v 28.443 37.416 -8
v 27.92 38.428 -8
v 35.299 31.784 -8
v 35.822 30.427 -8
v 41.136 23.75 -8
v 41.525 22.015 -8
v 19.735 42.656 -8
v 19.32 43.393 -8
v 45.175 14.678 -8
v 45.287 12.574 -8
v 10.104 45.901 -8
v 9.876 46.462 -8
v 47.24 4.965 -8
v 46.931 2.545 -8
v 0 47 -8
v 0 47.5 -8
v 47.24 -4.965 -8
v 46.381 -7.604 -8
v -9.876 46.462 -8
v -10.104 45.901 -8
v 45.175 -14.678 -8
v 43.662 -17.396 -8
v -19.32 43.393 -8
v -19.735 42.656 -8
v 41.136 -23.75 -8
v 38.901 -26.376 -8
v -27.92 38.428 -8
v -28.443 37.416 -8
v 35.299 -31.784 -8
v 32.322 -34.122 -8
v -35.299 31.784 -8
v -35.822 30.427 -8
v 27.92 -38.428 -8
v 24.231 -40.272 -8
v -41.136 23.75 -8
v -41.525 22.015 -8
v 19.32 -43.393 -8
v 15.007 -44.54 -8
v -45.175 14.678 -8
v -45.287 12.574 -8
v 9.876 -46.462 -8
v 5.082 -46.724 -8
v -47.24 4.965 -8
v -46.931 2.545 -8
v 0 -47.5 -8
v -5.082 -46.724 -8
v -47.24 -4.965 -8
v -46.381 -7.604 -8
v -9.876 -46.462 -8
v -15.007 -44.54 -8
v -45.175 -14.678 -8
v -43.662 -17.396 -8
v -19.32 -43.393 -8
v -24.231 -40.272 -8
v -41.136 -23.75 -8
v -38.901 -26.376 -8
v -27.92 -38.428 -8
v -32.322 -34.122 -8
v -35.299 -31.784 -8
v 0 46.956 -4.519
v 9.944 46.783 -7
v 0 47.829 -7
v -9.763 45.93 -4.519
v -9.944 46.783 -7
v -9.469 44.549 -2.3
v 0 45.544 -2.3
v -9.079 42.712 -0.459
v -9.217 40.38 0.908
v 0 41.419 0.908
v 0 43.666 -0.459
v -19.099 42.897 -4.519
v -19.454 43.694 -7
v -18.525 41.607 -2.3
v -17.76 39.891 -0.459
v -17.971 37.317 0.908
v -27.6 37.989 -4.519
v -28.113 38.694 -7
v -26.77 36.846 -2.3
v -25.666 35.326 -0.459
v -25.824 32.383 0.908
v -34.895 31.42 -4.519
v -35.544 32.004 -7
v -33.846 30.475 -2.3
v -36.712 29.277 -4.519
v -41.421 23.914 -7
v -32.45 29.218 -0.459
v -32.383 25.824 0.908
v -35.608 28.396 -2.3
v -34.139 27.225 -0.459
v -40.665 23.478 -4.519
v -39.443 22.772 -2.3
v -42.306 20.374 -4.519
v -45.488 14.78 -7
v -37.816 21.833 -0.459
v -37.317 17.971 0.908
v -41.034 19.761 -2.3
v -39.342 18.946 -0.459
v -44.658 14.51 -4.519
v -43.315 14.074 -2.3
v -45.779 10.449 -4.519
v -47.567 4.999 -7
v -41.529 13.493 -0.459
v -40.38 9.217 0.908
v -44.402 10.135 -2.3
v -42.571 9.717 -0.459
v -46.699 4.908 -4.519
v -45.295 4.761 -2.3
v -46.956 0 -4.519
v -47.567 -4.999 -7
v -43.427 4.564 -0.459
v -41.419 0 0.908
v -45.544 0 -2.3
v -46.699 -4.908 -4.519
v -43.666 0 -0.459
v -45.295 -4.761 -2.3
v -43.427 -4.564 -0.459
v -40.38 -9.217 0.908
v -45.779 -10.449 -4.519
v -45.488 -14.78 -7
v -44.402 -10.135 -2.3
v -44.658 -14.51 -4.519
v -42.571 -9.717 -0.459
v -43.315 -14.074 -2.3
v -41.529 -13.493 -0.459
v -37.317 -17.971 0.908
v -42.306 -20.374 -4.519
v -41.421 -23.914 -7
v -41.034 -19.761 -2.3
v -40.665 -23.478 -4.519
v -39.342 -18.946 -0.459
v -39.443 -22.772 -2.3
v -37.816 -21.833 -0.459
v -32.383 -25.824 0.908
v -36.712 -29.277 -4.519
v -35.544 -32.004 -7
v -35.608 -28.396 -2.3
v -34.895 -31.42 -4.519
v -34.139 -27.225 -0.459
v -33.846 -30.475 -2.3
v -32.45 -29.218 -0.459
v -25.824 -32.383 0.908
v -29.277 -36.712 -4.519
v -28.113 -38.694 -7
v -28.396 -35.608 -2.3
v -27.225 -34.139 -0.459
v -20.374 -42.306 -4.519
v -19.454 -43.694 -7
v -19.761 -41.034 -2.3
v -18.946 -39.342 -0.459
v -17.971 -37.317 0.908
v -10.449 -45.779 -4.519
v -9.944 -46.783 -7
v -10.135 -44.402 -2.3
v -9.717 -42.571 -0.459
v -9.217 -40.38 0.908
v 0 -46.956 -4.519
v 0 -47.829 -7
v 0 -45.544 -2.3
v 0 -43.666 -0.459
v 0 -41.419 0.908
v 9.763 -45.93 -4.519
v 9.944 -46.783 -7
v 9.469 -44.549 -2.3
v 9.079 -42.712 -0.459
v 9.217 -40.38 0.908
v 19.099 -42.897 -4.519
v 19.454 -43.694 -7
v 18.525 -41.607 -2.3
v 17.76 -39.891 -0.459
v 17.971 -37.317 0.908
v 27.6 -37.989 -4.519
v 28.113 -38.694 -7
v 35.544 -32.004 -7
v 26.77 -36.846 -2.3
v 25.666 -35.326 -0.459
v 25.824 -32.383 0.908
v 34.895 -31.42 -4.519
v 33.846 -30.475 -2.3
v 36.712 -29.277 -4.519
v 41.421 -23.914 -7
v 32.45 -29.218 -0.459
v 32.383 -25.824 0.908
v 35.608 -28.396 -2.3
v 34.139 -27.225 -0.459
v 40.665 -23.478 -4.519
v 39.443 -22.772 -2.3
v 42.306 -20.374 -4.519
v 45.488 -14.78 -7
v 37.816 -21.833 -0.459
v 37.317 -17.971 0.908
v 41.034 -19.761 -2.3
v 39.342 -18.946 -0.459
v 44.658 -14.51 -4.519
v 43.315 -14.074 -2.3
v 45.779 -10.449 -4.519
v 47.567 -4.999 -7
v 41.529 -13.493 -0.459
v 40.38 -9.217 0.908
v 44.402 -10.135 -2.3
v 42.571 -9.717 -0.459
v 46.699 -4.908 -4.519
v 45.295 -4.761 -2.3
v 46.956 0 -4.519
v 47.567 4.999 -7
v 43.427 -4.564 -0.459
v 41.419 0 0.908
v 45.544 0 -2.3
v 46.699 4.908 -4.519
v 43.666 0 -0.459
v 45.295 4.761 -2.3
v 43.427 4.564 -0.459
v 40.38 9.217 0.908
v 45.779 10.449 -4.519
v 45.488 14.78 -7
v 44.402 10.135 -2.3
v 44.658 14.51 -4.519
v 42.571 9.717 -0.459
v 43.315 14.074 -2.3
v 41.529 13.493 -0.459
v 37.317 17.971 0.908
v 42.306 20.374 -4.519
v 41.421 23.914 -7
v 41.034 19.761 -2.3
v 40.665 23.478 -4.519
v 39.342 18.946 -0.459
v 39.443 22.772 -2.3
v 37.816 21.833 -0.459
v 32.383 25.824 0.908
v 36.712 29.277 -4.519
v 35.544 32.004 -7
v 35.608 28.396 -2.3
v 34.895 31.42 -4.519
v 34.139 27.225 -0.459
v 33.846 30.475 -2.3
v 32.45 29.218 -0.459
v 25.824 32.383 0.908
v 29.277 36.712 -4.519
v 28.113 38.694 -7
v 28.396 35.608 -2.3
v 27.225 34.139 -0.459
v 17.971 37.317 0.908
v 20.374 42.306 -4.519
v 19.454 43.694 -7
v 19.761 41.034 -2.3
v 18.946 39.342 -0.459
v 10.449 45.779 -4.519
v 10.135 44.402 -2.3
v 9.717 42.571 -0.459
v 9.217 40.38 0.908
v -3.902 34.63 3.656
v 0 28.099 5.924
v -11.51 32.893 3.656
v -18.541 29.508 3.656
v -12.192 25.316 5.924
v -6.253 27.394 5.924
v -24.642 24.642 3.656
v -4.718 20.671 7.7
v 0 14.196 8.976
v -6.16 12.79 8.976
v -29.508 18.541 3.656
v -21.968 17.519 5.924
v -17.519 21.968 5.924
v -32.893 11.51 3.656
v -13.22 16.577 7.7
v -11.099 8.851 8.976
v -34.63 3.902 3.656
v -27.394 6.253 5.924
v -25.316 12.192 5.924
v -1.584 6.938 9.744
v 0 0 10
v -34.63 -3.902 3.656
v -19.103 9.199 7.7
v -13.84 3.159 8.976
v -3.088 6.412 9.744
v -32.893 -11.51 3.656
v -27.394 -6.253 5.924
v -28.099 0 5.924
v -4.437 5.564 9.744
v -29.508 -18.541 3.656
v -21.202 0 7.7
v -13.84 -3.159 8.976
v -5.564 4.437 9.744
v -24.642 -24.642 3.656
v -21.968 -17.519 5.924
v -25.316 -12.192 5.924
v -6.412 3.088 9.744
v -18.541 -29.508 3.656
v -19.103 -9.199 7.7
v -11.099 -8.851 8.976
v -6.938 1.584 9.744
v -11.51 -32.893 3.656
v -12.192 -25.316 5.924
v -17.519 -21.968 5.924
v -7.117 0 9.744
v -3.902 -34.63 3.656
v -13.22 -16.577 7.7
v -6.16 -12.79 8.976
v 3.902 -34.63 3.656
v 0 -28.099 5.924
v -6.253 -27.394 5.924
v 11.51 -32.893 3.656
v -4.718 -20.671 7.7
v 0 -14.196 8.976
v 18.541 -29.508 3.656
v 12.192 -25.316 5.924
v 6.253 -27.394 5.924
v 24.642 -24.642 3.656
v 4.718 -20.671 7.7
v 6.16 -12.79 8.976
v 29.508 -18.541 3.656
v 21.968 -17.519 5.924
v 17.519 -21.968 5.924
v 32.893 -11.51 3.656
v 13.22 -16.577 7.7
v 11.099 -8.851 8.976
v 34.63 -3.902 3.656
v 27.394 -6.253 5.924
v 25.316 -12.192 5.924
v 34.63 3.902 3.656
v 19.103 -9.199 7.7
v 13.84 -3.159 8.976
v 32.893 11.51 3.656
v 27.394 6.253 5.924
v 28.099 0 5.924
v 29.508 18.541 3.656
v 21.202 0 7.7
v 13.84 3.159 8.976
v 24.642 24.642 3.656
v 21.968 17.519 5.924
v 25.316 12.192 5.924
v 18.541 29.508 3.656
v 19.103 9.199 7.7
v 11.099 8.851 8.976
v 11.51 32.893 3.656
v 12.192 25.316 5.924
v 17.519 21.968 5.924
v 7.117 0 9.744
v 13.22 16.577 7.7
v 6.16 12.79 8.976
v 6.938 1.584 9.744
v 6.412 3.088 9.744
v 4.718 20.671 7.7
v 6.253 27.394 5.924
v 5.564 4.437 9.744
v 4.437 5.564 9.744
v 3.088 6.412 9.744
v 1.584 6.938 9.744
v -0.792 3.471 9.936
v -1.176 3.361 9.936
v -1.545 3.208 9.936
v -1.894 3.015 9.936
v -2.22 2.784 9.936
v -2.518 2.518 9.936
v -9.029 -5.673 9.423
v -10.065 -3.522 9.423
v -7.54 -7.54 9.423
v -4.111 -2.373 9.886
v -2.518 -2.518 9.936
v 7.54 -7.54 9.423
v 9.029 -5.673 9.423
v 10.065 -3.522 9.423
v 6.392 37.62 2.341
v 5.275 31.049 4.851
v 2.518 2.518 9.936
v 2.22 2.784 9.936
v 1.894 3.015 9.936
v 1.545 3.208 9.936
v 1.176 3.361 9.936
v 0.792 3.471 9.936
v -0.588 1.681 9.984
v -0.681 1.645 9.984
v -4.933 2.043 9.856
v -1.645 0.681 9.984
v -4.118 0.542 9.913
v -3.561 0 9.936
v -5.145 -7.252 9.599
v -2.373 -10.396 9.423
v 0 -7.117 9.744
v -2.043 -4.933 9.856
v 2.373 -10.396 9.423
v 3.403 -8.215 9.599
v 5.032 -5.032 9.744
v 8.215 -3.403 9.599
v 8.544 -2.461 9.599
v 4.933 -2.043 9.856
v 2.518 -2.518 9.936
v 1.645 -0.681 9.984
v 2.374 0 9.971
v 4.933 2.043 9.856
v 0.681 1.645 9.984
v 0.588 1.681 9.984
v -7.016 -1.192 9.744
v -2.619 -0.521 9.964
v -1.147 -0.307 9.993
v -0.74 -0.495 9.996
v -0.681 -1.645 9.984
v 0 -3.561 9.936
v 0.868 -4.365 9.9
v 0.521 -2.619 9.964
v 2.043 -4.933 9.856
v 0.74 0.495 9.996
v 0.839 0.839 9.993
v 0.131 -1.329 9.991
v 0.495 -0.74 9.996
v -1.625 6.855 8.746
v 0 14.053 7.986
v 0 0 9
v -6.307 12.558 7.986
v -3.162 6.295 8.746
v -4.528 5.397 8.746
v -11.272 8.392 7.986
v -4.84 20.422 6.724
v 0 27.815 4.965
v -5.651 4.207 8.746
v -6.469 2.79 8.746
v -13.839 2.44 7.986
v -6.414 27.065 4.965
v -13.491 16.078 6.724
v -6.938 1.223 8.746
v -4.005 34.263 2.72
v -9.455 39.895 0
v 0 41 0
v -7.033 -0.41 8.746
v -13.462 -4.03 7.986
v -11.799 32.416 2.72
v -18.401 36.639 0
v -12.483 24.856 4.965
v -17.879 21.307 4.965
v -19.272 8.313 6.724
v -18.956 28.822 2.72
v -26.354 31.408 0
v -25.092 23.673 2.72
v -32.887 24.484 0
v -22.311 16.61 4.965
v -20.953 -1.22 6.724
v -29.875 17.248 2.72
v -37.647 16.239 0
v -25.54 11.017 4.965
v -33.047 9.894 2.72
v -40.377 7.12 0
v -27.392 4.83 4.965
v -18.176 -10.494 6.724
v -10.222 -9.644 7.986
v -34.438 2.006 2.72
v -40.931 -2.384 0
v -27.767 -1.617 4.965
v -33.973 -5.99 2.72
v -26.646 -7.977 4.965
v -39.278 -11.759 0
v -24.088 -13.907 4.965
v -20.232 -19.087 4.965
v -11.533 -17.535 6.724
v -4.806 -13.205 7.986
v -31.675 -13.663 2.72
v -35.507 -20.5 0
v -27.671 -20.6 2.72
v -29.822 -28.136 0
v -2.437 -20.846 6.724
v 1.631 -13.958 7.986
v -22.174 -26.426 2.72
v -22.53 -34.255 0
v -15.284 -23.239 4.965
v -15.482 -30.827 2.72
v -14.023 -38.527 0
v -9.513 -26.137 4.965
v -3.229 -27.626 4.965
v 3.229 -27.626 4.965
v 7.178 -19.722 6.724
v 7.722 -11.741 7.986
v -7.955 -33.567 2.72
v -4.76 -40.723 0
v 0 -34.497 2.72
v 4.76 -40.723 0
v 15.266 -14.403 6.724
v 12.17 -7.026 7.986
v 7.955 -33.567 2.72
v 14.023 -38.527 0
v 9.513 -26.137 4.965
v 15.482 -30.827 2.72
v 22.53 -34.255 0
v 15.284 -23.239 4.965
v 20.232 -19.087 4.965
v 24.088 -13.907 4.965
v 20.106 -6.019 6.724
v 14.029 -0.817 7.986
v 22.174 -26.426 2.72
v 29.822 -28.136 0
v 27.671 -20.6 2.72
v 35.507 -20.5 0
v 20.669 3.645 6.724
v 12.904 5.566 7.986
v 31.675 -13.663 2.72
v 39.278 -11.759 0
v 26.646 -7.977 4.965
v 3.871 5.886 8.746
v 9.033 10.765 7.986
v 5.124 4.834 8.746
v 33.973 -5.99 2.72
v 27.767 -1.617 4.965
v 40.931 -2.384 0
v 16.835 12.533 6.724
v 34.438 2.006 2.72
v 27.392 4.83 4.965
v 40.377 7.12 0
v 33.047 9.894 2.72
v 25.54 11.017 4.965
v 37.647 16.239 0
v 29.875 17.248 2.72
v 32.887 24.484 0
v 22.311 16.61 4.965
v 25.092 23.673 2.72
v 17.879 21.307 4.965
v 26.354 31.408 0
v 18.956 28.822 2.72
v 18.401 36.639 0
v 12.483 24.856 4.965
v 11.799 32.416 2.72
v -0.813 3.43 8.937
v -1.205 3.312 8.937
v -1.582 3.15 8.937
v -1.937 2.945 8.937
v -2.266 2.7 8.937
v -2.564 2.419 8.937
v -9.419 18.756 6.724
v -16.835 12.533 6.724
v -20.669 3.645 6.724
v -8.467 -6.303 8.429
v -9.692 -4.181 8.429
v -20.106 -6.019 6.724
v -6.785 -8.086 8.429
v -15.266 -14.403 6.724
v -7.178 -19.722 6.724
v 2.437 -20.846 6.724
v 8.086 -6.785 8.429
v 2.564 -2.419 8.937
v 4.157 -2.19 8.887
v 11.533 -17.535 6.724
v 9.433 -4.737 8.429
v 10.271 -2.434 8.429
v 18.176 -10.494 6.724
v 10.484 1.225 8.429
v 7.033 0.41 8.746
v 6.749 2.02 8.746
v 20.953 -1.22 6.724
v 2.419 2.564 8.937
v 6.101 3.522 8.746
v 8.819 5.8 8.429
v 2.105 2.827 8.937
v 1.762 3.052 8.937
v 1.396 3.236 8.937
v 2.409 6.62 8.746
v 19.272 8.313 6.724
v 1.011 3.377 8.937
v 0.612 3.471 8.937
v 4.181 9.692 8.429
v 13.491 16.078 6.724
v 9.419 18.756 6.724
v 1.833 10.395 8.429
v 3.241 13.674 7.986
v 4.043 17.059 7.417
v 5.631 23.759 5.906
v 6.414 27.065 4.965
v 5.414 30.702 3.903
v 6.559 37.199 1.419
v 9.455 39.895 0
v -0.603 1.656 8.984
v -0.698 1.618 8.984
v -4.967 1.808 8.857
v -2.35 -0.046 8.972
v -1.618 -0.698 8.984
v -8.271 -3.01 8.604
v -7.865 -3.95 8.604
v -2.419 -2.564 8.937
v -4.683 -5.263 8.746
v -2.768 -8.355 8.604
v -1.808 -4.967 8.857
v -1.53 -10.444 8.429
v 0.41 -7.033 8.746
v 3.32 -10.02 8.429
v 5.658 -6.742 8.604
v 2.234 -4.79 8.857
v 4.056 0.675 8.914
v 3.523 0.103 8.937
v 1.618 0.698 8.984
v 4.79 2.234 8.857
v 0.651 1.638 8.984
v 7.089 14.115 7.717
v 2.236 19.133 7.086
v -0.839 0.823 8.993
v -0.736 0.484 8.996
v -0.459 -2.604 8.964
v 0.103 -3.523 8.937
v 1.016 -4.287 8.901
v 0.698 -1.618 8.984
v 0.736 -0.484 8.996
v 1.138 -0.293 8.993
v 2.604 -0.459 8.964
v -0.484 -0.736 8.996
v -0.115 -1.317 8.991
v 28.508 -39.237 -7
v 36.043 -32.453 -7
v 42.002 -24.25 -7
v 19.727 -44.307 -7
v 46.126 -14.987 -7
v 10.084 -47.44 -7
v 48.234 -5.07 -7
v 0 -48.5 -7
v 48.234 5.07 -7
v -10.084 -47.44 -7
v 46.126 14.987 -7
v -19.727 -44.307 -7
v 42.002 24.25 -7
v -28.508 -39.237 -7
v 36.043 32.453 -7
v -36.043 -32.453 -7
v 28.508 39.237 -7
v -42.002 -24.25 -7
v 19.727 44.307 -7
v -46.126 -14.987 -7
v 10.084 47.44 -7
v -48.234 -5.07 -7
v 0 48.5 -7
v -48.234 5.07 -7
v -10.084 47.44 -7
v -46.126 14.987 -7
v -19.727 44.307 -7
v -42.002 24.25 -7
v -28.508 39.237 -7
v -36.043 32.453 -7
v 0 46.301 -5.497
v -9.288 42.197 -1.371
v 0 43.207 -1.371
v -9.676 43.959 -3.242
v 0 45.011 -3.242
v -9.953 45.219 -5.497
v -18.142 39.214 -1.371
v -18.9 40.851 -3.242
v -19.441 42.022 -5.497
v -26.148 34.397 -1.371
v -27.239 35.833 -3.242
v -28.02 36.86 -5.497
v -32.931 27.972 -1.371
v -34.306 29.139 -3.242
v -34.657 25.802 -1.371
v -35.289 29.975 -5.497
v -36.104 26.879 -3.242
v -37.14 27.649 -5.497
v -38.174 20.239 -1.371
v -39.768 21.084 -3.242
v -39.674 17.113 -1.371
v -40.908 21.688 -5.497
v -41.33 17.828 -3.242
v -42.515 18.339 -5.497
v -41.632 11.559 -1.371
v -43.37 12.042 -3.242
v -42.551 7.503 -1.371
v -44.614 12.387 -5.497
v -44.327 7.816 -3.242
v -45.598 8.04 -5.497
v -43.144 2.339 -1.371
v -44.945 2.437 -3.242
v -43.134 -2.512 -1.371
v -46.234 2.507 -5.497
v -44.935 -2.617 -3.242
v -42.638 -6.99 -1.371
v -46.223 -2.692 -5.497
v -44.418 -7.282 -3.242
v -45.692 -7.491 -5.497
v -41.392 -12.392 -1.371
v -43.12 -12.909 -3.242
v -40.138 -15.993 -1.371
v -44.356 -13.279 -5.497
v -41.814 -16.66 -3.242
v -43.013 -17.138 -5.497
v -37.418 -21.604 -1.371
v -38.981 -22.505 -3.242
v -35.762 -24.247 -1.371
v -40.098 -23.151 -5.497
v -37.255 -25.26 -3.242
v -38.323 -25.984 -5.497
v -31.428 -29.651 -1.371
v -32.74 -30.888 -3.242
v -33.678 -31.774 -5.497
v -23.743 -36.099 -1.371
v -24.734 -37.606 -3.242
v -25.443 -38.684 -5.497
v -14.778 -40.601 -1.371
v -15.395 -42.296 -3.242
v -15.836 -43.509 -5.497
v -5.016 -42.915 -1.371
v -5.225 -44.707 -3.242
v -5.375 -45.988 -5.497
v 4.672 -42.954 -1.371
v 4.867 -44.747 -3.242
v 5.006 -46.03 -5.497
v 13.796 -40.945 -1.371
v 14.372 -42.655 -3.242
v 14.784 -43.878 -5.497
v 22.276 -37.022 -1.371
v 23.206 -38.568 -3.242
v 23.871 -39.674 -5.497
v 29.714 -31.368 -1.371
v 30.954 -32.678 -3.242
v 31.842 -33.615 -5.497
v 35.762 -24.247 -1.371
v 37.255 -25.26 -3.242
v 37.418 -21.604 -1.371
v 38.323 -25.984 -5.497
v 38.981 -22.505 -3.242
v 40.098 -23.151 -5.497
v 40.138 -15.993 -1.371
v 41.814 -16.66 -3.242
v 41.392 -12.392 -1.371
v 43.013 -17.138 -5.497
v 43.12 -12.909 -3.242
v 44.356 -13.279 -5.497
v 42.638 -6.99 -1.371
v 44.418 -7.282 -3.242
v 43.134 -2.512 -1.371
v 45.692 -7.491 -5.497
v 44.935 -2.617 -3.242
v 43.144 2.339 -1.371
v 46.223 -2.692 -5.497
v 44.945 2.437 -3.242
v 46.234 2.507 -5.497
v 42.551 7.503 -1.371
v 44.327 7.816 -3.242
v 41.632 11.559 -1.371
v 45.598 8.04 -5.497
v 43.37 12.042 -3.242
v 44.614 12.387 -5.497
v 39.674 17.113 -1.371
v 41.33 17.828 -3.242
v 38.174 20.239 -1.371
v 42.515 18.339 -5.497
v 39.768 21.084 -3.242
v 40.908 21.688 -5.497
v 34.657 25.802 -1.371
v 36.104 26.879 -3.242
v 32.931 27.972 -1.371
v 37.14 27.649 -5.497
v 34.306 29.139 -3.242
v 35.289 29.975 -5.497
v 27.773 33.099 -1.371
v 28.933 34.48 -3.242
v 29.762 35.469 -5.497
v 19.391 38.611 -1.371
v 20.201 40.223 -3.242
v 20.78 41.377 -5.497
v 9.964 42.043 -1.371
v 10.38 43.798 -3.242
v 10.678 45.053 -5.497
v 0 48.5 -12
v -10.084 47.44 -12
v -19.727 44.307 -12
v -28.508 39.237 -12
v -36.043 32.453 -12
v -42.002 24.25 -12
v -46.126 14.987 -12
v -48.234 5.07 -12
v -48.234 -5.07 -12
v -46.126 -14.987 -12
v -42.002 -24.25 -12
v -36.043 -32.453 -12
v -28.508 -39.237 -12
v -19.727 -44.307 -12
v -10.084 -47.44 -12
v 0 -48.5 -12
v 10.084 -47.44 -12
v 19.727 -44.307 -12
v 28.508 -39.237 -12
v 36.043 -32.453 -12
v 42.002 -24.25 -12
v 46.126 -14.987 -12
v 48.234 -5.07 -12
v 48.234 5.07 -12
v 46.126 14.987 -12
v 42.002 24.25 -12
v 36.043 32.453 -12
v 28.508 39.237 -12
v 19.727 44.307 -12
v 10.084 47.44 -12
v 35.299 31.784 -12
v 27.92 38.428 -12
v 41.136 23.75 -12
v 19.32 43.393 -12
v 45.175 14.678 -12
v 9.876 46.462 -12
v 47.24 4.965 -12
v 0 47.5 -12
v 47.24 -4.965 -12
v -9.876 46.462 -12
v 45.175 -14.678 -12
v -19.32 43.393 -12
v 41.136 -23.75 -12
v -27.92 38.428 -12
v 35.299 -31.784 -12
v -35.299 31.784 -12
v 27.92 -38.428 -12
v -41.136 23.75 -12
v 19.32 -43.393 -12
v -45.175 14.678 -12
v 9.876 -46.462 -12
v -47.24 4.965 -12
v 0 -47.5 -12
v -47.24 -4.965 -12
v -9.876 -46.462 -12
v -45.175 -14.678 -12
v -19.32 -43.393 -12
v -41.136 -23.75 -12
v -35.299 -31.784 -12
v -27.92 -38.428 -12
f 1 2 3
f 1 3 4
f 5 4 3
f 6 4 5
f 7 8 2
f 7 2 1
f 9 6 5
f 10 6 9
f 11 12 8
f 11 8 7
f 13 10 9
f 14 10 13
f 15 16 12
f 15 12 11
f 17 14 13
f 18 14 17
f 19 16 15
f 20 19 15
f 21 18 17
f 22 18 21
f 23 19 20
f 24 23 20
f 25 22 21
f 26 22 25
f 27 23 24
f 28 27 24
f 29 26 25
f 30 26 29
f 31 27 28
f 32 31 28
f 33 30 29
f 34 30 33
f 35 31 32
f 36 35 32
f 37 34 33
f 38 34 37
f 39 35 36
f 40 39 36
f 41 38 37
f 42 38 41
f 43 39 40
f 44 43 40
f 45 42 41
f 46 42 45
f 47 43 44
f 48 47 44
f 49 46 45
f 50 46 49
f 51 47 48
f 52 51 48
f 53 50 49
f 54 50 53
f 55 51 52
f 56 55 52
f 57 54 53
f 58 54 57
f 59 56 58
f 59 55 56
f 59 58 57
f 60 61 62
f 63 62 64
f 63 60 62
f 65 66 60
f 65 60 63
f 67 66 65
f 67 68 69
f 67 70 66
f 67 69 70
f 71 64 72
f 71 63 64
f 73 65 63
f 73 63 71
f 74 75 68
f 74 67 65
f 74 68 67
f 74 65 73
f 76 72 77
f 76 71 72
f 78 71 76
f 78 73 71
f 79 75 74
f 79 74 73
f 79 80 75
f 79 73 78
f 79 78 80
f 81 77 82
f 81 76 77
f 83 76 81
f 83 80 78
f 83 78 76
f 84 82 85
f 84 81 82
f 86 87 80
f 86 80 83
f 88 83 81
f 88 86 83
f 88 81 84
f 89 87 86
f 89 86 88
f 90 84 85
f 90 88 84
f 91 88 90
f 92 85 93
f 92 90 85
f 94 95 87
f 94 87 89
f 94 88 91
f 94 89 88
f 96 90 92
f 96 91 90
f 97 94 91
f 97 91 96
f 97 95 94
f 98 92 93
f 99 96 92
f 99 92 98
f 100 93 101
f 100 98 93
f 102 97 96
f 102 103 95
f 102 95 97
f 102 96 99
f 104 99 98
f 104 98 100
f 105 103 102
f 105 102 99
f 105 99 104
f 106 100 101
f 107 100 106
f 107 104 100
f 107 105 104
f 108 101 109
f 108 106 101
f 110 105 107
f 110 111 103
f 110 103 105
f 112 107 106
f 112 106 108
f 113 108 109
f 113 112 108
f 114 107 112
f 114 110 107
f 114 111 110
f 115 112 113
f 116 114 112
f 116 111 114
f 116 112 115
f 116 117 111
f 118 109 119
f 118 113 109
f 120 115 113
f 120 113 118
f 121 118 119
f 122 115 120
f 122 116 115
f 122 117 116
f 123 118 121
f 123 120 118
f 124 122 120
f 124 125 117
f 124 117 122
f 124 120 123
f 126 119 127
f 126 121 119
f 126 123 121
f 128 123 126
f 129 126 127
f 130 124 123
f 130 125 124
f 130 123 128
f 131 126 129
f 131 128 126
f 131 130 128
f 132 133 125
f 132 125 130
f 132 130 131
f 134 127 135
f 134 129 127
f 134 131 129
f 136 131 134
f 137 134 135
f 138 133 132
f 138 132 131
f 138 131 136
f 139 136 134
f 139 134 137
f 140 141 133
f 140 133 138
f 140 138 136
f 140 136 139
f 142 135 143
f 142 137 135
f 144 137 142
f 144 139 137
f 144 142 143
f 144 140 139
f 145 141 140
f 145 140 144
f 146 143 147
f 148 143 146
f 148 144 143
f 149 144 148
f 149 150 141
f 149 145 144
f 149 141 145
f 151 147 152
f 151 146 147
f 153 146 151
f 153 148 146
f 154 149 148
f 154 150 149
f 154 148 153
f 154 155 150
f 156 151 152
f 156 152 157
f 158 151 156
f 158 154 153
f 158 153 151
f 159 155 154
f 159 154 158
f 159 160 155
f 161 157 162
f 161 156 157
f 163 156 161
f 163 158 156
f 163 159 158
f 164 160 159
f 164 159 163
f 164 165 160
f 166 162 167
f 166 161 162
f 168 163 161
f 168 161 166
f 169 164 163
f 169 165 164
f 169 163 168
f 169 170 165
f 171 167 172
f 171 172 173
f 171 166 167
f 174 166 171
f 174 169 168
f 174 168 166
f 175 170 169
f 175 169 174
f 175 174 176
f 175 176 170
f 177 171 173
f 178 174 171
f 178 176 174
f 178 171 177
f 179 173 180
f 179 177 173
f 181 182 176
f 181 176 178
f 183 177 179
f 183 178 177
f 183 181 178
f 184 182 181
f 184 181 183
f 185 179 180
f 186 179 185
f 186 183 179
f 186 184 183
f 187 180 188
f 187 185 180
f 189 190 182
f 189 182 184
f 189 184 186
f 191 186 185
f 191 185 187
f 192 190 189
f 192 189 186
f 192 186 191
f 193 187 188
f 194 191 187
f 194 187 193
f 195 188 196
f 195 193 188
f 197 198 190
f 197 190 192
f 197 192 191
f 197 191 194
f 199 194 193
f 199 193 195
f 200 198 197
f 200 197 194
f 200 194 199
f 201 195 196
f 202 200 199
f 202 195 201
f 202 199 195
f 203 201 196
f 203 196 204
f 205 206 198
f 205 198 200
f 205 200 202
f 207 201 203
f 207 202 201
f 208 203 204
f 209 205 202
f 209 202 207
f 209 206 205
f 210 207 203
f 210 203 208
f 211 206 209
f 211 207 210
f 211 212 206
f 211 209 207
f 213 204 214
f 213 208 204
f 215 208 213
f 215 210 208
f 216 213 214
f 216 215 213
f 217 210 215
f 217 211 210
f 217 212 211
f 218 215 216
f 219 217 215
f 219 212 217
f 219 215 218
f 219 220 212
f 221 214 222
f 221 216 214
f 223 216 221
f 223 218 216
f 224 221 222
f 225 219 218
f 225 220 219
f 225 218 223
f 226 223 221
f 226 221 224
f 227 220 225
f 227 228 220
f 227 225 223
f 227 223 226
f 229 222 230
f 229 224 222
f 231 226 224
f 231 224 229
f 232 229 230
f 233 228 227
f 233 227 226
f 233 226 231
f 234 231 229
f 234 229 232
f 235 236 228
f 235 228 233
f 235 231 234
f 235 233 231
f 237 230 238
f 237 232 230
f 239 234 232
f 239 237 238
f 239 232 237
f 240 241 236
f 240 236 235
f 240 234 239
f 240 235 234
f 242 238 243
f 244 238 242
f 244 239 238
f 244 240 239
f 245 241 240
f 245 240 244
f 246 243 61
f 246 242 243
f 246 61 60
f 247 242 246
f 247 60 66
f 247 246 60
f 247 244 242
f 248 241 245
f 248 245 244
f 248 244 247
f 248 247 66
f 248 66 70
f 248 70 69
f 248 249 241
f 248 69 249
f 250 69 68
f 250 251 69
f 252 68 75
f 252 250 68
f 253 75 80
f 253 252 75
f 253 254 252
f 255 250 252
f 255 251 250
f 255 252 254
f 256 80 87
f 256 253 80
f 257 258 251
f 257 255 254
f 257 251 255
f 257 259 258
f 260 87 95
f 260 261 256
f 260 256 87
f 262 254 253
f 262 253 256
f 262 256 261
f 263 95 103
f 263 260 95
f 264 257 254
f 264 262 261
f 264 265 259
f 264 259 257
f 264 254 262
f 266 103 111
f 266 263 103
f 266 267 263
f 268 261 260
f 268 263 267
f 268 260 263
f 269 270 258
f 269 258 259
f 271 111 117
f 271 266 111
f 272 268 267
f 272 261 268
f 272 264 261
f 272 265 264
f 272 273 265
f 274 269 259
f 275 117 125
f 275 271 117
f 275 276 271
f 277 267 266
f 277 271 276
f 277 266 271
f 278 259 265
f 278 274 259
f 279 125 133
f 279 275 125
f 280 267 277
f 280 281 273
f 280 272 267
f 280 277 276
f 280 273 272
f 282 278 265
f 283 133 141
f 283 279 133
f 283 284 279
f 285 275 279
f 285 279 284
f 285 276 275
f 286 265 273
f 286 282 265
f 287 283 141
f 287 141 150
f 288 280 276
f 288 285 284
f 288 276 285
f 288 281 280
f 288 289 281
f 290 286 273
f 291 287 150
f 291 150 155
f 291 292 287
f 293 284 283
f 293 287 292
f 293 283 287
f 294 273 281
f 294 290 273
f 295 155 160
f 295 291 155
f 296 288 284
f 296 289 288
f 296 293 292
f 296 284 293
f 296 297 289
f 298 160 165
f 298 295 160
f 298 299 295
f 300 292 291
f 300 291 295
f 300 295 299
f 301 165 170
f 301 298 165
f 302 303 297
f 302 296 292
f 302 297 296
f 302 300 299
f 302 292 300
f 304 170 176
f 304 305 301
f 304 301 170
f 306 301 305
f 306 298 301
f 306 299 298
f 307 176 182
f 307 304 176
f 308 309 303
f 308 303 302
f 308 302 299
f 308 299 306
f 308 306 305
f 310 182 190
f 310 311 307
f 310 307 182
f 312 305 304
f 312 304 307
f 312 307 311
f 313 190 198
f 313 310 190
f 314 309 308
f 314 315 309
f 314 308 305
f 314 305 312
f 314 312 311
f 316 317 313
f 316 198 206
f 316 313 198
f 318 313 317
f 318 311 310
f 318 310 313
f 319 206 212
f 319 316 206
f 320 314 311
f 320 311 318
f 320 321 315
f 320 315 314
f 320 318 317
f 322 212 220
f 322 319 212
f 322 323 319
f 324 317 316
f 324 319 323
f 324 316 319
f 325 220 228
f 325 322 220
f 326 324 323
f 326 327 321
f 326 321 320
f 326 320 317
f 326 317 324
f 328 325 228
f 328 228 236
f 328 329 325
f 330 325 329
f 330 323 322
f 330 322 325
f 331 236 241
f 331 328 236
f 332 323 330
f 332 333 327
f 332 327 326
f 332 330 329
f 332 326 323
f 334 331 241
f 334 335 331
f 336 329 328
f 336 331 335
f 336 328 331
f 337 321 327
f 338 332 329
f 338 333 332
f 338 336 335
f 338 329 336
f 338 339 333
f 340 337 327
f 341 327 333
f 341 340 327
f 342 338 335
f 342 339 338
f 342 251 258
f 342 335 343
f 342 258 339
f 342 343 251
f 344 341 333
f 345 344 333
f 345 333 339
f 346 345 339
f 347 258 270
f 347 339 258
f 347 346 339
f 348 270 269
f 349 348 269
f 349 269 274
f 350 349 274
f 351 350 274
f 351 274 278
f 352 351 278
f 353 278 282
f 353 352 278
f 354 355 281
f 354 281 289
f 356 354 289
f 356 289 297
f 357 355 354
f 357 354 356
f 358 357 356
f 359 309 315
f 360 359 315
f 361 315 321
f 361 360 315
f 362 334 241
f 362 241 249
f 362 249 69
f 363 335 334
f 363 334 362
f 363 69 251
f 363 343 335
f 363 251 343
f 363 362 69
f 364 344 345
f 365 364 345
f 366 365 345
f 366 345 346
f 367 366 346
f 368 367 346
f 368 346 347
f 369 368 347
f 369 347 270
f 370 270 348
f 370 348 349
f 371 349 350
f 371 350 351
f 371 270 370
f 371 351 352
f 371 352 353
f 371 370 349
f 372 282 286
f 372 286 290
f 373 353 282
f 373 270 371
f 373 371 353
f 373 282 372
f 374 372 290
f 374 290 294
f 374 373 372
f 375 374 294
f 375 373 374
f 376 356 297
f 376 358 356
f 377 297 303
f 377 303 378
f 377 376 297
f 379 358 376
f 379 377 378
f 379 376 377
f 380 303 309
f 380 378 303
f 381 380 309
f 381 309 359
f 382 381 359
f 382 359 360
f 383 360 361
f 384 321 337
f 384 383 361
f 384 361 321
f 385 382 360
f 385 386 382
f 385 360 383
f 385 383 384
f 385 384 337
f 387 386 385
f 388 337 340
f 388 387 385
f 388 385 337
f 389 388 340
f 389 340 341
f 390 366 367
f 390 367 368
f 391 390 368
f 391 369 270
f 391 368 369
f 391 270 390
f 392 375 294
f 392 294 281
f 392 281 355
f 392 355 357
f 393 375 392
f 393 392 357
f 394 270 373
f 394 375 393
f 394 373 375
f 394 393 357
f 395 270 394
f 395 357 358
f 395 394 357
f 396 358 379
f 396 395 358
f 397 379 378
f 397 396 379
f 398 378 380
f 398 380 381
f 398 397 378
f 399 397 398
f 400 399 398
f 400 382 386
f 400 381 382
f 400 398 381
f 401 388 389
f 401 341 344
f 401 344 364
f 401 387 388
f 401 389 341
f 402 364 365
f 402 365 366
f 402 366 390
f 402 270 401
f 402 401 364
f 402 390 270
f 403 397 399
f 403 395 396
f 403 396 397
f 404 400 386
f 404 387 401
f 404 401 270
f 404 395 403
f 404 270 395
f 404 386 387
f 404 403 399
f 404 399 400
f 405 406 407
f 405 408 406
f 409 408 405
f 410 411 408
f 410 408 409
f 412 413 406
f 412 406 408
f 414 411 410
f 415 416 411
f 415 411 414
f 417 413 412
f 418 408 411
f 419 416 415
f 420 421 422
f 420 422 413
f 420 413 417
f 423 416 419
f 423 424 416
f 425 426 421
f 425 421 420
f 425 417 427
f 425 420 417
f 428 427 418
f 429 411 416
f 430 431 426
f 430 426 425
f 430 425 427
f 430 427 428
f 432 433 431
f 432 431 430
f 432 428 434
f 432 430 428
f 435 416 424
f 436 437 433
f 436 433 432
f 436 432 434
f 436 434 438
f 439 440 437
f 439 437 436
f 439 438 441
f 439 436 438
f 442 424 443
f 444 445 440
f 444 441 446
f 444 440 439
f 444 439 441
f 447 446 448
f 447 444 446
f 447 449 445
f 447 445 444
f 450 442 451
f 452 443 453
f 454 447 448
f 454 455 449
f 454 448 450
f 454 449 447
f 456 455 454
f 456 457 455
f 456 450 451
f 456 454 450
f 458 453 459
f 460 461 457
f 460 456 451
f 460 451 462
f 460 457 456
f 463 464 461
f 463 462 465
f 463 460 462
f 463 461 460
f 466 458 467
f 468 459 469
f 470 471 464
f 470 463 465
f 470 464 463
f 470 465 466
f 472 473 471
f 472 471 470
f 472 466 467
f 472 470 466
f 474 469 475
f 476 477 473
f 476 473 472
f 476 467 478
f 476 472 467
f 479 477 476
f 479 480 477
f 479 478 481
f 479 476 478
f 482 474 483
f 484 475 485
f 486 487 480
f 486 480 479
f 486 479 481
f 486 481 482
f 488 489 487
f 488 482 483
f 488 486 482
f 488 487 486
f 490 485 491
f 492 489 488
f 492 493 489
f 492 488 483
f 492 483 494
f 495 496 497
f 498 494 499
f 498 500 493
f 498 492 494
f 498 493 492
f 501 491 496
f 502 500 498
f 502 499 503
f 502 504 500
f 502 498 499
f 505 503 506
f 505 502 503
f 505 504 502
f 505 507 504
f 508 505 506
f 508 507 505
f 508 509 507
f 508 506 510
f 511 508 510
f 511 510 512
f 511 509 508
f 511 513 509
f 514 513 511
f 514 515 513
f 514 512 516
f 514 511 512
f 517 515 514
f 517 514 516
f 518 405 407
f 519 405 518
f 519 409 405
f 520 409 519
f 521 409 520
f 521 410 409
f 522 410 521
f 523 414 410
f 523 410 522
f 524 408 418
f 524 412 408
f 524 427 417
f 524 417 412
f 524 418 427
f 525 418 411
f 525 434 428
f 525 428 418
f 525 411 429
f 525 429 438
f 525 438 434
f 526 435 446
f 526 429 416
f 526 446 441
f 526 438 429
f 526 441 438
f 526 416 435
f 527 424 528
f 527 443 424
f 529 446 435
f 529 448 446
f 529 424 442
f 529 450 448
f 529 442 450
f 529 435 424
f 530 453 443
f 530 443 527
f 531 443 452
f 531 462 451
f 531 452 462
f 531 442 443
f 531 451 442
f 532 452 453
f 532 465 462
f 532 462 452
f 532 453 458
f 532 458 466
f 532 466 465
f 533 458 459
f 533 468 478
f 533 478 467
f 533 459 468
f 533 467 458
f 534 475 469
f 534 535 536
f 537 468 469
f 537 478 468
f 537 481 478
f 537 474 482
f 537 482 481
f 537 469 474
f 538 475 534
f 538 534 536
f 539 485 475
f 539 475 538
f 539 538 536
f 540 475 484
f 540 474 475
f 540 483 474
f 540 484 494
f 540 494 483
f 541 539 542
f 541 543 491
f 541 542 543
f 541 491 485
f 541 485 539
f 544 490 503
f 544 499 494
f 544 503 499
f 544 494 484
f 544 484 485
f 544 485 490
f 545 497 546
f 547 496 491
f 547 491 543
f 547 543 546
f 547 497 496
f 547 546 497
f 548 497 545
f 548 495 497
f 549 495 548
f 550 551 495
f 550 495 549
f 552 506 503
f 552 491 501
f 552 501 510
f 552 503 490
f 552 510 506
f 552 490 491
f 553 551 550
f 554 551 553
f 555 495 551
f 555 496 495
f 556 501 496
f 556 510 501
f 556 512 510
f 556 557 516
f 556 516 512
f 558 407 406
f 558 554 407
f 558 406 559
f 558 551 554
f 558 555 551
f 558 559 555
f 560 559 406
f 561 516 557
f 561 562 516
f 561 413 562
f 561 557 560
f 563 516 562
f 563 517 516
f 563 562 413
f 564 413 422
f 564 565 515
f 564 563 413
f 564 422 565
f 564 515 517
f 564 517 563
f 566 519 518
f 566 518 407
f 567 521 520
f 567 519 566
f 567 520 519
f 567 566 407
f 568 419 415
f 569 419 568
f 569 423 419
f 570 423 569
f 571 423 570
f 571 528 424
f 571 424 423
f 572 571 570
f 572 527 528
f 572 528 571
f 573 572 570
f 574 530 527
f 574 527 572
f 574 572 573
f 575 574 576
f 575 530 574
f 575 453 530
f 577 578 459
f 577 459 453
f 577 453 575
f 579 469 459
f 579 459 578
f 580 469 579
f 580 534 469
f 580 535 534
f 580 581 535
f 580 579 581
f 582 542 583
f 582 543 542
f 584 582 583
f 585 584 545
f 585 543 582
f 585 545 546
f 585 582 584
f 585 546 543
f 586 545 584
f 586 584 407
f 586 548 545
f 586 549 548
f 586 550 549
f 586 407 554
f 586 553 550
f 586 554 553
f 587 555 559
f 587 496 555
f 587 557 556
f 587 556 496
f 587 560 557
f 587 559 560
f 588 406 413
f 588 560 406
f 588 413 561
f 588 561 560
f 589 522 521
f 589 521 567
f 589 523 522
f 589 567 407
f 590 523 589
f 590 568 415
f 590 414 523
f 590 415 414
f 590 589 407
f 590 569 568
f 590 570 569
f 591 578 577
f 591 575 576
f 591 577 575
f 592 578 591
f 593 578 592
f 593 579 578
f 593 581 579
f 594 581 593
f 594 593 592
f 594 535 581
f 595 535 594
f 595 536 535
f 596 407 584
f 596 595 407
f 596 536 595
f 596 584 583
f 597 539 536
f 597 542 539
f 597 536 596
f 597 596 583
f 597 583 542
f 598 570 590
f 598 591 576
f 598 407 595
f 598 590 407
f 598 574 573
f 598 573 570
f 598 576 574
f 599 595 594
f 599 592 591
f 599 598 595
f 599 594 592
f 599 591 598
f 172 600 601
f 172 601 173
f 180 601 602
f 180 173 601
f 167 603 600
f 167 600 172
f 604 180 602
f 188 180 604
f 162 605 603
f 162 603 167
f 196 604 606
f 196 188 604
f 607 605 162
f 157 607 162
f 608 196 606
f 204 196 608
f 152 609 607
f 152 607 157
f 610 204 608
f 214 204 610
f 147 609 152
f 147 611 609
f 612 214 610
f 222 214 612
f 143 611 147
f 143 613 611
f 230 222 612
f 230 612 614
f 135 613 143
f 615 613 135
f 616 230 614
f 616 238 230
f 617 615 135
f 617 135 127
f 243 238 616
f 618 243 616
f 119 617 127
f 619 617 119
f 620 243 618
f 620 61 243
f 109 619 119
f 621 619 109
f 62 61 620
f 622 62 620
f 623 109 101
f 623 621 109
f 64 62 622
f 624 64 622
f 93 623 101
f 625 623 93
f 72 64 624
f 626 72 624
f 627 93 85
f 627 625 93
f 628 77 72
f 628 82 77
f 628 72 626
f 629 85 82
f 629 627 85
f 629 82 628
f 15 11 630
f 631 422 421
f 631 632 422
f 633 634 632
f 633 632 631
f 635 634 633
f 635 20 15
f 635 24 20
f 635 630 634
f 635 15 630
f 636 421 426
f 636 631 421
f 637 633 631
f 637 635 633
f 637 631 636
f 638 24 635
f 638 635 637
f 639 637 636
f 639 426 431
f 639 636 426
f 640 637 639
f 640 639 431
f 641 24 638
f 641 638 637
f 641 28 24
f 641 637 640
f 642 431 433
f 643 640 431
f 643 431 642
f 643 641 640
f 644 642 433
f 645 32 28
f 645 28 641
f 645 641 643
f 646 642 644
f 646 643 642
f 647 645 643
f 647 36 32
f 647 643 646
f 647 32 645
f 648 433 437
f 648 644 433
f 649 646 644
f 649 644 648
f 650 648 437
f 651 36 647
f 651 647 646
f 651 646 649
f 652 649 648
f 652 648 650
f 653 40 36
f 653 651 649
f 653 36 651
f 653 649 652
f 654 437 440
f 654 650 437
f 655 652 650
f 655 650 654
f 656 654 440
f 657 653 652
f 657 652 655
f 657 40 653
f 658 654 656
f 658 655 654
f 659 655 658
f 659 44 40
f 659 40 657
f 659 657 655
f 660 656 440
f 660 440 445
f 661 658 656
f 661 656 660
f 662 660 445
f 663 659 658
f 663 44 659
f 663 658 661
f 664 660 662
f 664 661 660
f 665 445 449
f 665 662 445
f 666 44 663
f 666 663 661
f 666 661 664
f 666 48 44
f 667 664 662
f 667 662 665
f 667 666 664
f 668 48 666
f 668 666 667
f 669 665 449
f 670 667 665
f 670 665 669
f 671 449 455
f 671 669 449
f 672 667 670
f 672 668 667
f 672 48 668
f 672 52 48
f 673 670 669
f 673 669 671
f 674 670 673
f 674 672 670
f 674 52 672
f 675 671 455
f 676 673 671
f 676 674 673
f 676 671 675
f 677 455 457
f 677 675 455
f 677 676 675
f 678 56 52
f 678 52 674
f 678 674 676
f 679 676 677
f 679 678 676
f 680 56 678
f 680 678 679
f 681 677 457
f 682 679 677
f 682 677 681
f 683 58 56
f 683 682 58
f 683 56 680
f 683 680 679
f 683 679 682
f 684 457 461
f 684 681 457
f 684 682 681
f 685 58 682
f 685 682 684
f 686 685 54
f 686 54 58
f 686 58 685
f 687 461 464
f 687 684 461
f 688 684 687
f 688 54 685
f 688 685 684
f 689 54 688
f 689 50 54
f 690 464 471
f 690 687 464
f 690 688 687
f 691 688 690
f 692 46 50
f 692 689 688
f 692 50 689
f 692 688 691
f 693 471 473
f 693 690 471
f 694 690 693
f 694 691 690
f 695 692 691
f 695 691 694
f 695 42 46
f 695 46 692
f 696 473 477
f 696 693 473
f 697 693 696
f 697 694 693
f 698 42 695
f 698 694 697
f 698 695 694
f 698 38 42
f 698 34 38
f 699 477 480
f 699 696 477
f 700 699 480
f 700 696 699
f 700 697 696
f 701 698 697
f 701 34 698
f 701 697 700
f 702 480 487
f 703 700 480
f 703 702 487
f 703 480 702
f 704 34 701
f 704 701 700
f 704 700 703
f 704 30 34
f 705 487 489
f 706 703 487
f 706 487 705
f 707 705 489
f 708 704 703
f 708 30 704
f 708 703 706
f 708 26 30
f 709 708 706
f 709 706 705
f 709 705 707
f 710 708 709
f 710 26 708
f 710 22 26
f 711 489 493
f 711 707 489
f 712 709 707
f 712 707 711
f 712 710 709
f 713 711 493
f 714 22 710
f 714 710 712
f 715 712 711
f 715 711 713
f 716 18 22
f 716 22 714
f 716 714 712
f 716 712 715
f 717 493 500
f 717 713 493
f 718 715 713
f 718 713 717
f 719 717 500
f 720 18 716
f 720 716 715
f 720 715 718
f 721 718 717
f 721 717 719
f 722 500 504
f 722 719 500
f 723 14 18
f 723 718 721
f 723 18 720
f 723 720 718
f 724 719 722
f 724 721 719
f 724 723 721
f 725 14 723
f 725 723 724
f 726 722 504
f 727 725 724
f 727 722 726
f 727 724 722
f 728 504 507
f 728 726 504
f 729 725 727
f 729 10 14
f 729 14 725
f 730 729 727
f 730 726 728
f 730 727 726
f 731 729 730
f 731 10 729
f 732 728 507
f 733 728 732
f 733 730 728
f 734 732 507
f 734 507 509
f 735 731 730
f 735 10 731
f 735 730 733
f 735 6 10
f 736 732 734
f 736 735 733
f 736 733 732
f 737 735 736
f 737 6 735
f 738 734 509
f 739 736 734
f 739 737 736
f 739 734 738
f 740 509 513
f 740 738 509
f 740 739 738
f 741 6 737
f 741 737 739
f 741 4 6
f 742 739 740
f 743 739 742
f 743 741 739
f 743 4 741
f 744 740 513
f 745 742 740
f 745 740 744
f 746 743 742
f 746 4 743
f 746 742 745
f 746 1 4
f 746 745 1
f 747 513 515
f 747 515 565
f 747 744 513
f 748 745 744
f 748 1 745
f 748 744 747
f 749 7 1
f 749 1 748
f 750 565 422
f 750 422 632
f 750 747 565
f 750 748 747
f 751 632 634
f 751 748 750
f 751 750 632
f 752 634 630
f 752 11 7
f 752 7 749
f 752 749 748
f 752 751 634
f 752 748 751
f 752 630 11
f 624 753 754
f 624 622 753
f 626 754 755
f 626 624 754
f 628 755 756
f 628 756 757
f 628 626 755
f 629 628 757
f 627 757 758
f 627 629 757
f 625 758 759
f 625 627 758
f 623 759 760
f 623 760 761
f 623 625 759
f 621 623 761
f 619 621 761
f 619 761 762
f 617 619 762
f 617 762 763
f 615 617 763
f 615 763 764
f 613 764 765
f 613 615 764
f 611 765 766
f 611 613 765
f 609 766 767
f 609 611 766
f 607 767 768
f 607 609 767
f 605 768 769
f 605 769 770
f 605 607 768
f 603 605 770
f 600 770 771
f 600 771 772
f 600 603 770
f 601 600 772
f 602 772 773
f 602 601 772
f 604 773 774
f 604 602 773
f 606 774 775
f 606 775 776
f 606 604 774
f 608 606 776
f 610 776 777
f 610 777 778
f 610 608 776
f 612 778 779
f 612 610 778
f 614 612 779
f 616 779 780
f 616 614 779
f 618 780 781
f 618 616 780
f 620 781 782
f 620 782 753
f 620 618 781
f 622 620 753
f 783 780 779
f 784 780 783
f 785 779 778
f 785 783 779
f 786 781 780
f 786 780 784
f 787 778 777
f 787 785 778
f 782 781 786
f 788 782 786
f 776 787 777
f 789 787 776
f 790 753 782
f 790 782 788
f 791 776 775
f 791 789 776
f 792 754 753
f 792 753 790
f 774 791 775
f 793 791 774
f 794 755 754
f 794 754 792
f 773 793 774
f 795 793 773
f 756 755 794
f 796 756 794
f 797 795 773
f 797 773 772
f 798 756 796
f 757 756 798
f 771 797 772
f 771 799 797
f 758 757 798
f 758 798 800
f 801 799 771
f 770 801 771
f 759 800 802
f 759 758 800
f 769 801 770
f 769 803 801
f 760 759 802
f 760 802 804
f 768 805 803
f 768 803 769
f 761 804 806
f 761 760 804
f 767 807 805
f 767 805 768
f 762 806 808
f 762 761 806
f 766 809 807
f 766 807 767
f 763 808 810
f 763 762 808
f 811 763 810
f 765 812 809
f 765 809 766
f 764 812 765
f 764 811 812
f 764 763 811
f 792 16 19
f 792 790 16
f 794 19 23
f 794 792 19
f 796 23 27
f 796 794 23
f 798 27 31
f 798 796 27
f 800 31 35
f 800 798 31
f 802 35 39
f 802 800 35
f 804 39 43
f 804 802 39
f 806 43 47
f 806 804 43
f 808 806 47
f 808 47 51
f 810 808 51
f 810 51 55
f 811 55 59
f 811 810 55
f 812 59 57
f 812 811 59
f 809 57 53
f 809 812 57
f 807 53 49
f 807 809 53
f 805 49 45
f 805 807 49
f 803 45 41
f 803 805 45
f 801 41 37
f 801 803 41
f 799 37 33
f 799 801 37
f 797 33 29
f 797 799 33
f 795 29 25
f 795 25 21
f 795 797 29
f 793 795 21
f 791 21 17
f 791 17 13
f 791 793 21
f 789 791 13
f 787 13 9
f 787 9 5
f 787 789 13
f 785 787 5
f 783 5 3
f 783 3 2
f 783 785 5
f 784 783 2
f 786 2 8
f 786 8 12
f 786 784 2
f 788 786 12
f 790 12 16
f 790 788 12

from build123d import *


with BuildPart() as f1:
    # F0 (on Right) → F1 (revolve)
    with BuildSketch(Plane.YZ):
        with BuildLine():
            ThreePointArc((0, 9), (20.988092, 6.72353), (41, 0))
            ThreePointArc((41, 0), (45.010989, -3.241758), (47, -8))
            Line((47, -8), (47.5, -8))
            Line((47.5, -8), (47.5, -12))
            Line((47.5, -12), (48.5, -12))
            Line((48.5, -12), (48.5, -7))
            Line((48.5, -7), (47.828647, -7))
            ThreePointArc((47.828647, -7), (45.544324, -2.299803), (41.418842, 0.908059))
            ThreePointArc((41.418842, 0.908059), (21.202499, 7.700274), (0, 10))
            Line((0, 10), (0, 9))
        make_face()
    revolve(axis=Axis((0, 0, 4.5), (0, 0, 1)))


solid = f1.part
